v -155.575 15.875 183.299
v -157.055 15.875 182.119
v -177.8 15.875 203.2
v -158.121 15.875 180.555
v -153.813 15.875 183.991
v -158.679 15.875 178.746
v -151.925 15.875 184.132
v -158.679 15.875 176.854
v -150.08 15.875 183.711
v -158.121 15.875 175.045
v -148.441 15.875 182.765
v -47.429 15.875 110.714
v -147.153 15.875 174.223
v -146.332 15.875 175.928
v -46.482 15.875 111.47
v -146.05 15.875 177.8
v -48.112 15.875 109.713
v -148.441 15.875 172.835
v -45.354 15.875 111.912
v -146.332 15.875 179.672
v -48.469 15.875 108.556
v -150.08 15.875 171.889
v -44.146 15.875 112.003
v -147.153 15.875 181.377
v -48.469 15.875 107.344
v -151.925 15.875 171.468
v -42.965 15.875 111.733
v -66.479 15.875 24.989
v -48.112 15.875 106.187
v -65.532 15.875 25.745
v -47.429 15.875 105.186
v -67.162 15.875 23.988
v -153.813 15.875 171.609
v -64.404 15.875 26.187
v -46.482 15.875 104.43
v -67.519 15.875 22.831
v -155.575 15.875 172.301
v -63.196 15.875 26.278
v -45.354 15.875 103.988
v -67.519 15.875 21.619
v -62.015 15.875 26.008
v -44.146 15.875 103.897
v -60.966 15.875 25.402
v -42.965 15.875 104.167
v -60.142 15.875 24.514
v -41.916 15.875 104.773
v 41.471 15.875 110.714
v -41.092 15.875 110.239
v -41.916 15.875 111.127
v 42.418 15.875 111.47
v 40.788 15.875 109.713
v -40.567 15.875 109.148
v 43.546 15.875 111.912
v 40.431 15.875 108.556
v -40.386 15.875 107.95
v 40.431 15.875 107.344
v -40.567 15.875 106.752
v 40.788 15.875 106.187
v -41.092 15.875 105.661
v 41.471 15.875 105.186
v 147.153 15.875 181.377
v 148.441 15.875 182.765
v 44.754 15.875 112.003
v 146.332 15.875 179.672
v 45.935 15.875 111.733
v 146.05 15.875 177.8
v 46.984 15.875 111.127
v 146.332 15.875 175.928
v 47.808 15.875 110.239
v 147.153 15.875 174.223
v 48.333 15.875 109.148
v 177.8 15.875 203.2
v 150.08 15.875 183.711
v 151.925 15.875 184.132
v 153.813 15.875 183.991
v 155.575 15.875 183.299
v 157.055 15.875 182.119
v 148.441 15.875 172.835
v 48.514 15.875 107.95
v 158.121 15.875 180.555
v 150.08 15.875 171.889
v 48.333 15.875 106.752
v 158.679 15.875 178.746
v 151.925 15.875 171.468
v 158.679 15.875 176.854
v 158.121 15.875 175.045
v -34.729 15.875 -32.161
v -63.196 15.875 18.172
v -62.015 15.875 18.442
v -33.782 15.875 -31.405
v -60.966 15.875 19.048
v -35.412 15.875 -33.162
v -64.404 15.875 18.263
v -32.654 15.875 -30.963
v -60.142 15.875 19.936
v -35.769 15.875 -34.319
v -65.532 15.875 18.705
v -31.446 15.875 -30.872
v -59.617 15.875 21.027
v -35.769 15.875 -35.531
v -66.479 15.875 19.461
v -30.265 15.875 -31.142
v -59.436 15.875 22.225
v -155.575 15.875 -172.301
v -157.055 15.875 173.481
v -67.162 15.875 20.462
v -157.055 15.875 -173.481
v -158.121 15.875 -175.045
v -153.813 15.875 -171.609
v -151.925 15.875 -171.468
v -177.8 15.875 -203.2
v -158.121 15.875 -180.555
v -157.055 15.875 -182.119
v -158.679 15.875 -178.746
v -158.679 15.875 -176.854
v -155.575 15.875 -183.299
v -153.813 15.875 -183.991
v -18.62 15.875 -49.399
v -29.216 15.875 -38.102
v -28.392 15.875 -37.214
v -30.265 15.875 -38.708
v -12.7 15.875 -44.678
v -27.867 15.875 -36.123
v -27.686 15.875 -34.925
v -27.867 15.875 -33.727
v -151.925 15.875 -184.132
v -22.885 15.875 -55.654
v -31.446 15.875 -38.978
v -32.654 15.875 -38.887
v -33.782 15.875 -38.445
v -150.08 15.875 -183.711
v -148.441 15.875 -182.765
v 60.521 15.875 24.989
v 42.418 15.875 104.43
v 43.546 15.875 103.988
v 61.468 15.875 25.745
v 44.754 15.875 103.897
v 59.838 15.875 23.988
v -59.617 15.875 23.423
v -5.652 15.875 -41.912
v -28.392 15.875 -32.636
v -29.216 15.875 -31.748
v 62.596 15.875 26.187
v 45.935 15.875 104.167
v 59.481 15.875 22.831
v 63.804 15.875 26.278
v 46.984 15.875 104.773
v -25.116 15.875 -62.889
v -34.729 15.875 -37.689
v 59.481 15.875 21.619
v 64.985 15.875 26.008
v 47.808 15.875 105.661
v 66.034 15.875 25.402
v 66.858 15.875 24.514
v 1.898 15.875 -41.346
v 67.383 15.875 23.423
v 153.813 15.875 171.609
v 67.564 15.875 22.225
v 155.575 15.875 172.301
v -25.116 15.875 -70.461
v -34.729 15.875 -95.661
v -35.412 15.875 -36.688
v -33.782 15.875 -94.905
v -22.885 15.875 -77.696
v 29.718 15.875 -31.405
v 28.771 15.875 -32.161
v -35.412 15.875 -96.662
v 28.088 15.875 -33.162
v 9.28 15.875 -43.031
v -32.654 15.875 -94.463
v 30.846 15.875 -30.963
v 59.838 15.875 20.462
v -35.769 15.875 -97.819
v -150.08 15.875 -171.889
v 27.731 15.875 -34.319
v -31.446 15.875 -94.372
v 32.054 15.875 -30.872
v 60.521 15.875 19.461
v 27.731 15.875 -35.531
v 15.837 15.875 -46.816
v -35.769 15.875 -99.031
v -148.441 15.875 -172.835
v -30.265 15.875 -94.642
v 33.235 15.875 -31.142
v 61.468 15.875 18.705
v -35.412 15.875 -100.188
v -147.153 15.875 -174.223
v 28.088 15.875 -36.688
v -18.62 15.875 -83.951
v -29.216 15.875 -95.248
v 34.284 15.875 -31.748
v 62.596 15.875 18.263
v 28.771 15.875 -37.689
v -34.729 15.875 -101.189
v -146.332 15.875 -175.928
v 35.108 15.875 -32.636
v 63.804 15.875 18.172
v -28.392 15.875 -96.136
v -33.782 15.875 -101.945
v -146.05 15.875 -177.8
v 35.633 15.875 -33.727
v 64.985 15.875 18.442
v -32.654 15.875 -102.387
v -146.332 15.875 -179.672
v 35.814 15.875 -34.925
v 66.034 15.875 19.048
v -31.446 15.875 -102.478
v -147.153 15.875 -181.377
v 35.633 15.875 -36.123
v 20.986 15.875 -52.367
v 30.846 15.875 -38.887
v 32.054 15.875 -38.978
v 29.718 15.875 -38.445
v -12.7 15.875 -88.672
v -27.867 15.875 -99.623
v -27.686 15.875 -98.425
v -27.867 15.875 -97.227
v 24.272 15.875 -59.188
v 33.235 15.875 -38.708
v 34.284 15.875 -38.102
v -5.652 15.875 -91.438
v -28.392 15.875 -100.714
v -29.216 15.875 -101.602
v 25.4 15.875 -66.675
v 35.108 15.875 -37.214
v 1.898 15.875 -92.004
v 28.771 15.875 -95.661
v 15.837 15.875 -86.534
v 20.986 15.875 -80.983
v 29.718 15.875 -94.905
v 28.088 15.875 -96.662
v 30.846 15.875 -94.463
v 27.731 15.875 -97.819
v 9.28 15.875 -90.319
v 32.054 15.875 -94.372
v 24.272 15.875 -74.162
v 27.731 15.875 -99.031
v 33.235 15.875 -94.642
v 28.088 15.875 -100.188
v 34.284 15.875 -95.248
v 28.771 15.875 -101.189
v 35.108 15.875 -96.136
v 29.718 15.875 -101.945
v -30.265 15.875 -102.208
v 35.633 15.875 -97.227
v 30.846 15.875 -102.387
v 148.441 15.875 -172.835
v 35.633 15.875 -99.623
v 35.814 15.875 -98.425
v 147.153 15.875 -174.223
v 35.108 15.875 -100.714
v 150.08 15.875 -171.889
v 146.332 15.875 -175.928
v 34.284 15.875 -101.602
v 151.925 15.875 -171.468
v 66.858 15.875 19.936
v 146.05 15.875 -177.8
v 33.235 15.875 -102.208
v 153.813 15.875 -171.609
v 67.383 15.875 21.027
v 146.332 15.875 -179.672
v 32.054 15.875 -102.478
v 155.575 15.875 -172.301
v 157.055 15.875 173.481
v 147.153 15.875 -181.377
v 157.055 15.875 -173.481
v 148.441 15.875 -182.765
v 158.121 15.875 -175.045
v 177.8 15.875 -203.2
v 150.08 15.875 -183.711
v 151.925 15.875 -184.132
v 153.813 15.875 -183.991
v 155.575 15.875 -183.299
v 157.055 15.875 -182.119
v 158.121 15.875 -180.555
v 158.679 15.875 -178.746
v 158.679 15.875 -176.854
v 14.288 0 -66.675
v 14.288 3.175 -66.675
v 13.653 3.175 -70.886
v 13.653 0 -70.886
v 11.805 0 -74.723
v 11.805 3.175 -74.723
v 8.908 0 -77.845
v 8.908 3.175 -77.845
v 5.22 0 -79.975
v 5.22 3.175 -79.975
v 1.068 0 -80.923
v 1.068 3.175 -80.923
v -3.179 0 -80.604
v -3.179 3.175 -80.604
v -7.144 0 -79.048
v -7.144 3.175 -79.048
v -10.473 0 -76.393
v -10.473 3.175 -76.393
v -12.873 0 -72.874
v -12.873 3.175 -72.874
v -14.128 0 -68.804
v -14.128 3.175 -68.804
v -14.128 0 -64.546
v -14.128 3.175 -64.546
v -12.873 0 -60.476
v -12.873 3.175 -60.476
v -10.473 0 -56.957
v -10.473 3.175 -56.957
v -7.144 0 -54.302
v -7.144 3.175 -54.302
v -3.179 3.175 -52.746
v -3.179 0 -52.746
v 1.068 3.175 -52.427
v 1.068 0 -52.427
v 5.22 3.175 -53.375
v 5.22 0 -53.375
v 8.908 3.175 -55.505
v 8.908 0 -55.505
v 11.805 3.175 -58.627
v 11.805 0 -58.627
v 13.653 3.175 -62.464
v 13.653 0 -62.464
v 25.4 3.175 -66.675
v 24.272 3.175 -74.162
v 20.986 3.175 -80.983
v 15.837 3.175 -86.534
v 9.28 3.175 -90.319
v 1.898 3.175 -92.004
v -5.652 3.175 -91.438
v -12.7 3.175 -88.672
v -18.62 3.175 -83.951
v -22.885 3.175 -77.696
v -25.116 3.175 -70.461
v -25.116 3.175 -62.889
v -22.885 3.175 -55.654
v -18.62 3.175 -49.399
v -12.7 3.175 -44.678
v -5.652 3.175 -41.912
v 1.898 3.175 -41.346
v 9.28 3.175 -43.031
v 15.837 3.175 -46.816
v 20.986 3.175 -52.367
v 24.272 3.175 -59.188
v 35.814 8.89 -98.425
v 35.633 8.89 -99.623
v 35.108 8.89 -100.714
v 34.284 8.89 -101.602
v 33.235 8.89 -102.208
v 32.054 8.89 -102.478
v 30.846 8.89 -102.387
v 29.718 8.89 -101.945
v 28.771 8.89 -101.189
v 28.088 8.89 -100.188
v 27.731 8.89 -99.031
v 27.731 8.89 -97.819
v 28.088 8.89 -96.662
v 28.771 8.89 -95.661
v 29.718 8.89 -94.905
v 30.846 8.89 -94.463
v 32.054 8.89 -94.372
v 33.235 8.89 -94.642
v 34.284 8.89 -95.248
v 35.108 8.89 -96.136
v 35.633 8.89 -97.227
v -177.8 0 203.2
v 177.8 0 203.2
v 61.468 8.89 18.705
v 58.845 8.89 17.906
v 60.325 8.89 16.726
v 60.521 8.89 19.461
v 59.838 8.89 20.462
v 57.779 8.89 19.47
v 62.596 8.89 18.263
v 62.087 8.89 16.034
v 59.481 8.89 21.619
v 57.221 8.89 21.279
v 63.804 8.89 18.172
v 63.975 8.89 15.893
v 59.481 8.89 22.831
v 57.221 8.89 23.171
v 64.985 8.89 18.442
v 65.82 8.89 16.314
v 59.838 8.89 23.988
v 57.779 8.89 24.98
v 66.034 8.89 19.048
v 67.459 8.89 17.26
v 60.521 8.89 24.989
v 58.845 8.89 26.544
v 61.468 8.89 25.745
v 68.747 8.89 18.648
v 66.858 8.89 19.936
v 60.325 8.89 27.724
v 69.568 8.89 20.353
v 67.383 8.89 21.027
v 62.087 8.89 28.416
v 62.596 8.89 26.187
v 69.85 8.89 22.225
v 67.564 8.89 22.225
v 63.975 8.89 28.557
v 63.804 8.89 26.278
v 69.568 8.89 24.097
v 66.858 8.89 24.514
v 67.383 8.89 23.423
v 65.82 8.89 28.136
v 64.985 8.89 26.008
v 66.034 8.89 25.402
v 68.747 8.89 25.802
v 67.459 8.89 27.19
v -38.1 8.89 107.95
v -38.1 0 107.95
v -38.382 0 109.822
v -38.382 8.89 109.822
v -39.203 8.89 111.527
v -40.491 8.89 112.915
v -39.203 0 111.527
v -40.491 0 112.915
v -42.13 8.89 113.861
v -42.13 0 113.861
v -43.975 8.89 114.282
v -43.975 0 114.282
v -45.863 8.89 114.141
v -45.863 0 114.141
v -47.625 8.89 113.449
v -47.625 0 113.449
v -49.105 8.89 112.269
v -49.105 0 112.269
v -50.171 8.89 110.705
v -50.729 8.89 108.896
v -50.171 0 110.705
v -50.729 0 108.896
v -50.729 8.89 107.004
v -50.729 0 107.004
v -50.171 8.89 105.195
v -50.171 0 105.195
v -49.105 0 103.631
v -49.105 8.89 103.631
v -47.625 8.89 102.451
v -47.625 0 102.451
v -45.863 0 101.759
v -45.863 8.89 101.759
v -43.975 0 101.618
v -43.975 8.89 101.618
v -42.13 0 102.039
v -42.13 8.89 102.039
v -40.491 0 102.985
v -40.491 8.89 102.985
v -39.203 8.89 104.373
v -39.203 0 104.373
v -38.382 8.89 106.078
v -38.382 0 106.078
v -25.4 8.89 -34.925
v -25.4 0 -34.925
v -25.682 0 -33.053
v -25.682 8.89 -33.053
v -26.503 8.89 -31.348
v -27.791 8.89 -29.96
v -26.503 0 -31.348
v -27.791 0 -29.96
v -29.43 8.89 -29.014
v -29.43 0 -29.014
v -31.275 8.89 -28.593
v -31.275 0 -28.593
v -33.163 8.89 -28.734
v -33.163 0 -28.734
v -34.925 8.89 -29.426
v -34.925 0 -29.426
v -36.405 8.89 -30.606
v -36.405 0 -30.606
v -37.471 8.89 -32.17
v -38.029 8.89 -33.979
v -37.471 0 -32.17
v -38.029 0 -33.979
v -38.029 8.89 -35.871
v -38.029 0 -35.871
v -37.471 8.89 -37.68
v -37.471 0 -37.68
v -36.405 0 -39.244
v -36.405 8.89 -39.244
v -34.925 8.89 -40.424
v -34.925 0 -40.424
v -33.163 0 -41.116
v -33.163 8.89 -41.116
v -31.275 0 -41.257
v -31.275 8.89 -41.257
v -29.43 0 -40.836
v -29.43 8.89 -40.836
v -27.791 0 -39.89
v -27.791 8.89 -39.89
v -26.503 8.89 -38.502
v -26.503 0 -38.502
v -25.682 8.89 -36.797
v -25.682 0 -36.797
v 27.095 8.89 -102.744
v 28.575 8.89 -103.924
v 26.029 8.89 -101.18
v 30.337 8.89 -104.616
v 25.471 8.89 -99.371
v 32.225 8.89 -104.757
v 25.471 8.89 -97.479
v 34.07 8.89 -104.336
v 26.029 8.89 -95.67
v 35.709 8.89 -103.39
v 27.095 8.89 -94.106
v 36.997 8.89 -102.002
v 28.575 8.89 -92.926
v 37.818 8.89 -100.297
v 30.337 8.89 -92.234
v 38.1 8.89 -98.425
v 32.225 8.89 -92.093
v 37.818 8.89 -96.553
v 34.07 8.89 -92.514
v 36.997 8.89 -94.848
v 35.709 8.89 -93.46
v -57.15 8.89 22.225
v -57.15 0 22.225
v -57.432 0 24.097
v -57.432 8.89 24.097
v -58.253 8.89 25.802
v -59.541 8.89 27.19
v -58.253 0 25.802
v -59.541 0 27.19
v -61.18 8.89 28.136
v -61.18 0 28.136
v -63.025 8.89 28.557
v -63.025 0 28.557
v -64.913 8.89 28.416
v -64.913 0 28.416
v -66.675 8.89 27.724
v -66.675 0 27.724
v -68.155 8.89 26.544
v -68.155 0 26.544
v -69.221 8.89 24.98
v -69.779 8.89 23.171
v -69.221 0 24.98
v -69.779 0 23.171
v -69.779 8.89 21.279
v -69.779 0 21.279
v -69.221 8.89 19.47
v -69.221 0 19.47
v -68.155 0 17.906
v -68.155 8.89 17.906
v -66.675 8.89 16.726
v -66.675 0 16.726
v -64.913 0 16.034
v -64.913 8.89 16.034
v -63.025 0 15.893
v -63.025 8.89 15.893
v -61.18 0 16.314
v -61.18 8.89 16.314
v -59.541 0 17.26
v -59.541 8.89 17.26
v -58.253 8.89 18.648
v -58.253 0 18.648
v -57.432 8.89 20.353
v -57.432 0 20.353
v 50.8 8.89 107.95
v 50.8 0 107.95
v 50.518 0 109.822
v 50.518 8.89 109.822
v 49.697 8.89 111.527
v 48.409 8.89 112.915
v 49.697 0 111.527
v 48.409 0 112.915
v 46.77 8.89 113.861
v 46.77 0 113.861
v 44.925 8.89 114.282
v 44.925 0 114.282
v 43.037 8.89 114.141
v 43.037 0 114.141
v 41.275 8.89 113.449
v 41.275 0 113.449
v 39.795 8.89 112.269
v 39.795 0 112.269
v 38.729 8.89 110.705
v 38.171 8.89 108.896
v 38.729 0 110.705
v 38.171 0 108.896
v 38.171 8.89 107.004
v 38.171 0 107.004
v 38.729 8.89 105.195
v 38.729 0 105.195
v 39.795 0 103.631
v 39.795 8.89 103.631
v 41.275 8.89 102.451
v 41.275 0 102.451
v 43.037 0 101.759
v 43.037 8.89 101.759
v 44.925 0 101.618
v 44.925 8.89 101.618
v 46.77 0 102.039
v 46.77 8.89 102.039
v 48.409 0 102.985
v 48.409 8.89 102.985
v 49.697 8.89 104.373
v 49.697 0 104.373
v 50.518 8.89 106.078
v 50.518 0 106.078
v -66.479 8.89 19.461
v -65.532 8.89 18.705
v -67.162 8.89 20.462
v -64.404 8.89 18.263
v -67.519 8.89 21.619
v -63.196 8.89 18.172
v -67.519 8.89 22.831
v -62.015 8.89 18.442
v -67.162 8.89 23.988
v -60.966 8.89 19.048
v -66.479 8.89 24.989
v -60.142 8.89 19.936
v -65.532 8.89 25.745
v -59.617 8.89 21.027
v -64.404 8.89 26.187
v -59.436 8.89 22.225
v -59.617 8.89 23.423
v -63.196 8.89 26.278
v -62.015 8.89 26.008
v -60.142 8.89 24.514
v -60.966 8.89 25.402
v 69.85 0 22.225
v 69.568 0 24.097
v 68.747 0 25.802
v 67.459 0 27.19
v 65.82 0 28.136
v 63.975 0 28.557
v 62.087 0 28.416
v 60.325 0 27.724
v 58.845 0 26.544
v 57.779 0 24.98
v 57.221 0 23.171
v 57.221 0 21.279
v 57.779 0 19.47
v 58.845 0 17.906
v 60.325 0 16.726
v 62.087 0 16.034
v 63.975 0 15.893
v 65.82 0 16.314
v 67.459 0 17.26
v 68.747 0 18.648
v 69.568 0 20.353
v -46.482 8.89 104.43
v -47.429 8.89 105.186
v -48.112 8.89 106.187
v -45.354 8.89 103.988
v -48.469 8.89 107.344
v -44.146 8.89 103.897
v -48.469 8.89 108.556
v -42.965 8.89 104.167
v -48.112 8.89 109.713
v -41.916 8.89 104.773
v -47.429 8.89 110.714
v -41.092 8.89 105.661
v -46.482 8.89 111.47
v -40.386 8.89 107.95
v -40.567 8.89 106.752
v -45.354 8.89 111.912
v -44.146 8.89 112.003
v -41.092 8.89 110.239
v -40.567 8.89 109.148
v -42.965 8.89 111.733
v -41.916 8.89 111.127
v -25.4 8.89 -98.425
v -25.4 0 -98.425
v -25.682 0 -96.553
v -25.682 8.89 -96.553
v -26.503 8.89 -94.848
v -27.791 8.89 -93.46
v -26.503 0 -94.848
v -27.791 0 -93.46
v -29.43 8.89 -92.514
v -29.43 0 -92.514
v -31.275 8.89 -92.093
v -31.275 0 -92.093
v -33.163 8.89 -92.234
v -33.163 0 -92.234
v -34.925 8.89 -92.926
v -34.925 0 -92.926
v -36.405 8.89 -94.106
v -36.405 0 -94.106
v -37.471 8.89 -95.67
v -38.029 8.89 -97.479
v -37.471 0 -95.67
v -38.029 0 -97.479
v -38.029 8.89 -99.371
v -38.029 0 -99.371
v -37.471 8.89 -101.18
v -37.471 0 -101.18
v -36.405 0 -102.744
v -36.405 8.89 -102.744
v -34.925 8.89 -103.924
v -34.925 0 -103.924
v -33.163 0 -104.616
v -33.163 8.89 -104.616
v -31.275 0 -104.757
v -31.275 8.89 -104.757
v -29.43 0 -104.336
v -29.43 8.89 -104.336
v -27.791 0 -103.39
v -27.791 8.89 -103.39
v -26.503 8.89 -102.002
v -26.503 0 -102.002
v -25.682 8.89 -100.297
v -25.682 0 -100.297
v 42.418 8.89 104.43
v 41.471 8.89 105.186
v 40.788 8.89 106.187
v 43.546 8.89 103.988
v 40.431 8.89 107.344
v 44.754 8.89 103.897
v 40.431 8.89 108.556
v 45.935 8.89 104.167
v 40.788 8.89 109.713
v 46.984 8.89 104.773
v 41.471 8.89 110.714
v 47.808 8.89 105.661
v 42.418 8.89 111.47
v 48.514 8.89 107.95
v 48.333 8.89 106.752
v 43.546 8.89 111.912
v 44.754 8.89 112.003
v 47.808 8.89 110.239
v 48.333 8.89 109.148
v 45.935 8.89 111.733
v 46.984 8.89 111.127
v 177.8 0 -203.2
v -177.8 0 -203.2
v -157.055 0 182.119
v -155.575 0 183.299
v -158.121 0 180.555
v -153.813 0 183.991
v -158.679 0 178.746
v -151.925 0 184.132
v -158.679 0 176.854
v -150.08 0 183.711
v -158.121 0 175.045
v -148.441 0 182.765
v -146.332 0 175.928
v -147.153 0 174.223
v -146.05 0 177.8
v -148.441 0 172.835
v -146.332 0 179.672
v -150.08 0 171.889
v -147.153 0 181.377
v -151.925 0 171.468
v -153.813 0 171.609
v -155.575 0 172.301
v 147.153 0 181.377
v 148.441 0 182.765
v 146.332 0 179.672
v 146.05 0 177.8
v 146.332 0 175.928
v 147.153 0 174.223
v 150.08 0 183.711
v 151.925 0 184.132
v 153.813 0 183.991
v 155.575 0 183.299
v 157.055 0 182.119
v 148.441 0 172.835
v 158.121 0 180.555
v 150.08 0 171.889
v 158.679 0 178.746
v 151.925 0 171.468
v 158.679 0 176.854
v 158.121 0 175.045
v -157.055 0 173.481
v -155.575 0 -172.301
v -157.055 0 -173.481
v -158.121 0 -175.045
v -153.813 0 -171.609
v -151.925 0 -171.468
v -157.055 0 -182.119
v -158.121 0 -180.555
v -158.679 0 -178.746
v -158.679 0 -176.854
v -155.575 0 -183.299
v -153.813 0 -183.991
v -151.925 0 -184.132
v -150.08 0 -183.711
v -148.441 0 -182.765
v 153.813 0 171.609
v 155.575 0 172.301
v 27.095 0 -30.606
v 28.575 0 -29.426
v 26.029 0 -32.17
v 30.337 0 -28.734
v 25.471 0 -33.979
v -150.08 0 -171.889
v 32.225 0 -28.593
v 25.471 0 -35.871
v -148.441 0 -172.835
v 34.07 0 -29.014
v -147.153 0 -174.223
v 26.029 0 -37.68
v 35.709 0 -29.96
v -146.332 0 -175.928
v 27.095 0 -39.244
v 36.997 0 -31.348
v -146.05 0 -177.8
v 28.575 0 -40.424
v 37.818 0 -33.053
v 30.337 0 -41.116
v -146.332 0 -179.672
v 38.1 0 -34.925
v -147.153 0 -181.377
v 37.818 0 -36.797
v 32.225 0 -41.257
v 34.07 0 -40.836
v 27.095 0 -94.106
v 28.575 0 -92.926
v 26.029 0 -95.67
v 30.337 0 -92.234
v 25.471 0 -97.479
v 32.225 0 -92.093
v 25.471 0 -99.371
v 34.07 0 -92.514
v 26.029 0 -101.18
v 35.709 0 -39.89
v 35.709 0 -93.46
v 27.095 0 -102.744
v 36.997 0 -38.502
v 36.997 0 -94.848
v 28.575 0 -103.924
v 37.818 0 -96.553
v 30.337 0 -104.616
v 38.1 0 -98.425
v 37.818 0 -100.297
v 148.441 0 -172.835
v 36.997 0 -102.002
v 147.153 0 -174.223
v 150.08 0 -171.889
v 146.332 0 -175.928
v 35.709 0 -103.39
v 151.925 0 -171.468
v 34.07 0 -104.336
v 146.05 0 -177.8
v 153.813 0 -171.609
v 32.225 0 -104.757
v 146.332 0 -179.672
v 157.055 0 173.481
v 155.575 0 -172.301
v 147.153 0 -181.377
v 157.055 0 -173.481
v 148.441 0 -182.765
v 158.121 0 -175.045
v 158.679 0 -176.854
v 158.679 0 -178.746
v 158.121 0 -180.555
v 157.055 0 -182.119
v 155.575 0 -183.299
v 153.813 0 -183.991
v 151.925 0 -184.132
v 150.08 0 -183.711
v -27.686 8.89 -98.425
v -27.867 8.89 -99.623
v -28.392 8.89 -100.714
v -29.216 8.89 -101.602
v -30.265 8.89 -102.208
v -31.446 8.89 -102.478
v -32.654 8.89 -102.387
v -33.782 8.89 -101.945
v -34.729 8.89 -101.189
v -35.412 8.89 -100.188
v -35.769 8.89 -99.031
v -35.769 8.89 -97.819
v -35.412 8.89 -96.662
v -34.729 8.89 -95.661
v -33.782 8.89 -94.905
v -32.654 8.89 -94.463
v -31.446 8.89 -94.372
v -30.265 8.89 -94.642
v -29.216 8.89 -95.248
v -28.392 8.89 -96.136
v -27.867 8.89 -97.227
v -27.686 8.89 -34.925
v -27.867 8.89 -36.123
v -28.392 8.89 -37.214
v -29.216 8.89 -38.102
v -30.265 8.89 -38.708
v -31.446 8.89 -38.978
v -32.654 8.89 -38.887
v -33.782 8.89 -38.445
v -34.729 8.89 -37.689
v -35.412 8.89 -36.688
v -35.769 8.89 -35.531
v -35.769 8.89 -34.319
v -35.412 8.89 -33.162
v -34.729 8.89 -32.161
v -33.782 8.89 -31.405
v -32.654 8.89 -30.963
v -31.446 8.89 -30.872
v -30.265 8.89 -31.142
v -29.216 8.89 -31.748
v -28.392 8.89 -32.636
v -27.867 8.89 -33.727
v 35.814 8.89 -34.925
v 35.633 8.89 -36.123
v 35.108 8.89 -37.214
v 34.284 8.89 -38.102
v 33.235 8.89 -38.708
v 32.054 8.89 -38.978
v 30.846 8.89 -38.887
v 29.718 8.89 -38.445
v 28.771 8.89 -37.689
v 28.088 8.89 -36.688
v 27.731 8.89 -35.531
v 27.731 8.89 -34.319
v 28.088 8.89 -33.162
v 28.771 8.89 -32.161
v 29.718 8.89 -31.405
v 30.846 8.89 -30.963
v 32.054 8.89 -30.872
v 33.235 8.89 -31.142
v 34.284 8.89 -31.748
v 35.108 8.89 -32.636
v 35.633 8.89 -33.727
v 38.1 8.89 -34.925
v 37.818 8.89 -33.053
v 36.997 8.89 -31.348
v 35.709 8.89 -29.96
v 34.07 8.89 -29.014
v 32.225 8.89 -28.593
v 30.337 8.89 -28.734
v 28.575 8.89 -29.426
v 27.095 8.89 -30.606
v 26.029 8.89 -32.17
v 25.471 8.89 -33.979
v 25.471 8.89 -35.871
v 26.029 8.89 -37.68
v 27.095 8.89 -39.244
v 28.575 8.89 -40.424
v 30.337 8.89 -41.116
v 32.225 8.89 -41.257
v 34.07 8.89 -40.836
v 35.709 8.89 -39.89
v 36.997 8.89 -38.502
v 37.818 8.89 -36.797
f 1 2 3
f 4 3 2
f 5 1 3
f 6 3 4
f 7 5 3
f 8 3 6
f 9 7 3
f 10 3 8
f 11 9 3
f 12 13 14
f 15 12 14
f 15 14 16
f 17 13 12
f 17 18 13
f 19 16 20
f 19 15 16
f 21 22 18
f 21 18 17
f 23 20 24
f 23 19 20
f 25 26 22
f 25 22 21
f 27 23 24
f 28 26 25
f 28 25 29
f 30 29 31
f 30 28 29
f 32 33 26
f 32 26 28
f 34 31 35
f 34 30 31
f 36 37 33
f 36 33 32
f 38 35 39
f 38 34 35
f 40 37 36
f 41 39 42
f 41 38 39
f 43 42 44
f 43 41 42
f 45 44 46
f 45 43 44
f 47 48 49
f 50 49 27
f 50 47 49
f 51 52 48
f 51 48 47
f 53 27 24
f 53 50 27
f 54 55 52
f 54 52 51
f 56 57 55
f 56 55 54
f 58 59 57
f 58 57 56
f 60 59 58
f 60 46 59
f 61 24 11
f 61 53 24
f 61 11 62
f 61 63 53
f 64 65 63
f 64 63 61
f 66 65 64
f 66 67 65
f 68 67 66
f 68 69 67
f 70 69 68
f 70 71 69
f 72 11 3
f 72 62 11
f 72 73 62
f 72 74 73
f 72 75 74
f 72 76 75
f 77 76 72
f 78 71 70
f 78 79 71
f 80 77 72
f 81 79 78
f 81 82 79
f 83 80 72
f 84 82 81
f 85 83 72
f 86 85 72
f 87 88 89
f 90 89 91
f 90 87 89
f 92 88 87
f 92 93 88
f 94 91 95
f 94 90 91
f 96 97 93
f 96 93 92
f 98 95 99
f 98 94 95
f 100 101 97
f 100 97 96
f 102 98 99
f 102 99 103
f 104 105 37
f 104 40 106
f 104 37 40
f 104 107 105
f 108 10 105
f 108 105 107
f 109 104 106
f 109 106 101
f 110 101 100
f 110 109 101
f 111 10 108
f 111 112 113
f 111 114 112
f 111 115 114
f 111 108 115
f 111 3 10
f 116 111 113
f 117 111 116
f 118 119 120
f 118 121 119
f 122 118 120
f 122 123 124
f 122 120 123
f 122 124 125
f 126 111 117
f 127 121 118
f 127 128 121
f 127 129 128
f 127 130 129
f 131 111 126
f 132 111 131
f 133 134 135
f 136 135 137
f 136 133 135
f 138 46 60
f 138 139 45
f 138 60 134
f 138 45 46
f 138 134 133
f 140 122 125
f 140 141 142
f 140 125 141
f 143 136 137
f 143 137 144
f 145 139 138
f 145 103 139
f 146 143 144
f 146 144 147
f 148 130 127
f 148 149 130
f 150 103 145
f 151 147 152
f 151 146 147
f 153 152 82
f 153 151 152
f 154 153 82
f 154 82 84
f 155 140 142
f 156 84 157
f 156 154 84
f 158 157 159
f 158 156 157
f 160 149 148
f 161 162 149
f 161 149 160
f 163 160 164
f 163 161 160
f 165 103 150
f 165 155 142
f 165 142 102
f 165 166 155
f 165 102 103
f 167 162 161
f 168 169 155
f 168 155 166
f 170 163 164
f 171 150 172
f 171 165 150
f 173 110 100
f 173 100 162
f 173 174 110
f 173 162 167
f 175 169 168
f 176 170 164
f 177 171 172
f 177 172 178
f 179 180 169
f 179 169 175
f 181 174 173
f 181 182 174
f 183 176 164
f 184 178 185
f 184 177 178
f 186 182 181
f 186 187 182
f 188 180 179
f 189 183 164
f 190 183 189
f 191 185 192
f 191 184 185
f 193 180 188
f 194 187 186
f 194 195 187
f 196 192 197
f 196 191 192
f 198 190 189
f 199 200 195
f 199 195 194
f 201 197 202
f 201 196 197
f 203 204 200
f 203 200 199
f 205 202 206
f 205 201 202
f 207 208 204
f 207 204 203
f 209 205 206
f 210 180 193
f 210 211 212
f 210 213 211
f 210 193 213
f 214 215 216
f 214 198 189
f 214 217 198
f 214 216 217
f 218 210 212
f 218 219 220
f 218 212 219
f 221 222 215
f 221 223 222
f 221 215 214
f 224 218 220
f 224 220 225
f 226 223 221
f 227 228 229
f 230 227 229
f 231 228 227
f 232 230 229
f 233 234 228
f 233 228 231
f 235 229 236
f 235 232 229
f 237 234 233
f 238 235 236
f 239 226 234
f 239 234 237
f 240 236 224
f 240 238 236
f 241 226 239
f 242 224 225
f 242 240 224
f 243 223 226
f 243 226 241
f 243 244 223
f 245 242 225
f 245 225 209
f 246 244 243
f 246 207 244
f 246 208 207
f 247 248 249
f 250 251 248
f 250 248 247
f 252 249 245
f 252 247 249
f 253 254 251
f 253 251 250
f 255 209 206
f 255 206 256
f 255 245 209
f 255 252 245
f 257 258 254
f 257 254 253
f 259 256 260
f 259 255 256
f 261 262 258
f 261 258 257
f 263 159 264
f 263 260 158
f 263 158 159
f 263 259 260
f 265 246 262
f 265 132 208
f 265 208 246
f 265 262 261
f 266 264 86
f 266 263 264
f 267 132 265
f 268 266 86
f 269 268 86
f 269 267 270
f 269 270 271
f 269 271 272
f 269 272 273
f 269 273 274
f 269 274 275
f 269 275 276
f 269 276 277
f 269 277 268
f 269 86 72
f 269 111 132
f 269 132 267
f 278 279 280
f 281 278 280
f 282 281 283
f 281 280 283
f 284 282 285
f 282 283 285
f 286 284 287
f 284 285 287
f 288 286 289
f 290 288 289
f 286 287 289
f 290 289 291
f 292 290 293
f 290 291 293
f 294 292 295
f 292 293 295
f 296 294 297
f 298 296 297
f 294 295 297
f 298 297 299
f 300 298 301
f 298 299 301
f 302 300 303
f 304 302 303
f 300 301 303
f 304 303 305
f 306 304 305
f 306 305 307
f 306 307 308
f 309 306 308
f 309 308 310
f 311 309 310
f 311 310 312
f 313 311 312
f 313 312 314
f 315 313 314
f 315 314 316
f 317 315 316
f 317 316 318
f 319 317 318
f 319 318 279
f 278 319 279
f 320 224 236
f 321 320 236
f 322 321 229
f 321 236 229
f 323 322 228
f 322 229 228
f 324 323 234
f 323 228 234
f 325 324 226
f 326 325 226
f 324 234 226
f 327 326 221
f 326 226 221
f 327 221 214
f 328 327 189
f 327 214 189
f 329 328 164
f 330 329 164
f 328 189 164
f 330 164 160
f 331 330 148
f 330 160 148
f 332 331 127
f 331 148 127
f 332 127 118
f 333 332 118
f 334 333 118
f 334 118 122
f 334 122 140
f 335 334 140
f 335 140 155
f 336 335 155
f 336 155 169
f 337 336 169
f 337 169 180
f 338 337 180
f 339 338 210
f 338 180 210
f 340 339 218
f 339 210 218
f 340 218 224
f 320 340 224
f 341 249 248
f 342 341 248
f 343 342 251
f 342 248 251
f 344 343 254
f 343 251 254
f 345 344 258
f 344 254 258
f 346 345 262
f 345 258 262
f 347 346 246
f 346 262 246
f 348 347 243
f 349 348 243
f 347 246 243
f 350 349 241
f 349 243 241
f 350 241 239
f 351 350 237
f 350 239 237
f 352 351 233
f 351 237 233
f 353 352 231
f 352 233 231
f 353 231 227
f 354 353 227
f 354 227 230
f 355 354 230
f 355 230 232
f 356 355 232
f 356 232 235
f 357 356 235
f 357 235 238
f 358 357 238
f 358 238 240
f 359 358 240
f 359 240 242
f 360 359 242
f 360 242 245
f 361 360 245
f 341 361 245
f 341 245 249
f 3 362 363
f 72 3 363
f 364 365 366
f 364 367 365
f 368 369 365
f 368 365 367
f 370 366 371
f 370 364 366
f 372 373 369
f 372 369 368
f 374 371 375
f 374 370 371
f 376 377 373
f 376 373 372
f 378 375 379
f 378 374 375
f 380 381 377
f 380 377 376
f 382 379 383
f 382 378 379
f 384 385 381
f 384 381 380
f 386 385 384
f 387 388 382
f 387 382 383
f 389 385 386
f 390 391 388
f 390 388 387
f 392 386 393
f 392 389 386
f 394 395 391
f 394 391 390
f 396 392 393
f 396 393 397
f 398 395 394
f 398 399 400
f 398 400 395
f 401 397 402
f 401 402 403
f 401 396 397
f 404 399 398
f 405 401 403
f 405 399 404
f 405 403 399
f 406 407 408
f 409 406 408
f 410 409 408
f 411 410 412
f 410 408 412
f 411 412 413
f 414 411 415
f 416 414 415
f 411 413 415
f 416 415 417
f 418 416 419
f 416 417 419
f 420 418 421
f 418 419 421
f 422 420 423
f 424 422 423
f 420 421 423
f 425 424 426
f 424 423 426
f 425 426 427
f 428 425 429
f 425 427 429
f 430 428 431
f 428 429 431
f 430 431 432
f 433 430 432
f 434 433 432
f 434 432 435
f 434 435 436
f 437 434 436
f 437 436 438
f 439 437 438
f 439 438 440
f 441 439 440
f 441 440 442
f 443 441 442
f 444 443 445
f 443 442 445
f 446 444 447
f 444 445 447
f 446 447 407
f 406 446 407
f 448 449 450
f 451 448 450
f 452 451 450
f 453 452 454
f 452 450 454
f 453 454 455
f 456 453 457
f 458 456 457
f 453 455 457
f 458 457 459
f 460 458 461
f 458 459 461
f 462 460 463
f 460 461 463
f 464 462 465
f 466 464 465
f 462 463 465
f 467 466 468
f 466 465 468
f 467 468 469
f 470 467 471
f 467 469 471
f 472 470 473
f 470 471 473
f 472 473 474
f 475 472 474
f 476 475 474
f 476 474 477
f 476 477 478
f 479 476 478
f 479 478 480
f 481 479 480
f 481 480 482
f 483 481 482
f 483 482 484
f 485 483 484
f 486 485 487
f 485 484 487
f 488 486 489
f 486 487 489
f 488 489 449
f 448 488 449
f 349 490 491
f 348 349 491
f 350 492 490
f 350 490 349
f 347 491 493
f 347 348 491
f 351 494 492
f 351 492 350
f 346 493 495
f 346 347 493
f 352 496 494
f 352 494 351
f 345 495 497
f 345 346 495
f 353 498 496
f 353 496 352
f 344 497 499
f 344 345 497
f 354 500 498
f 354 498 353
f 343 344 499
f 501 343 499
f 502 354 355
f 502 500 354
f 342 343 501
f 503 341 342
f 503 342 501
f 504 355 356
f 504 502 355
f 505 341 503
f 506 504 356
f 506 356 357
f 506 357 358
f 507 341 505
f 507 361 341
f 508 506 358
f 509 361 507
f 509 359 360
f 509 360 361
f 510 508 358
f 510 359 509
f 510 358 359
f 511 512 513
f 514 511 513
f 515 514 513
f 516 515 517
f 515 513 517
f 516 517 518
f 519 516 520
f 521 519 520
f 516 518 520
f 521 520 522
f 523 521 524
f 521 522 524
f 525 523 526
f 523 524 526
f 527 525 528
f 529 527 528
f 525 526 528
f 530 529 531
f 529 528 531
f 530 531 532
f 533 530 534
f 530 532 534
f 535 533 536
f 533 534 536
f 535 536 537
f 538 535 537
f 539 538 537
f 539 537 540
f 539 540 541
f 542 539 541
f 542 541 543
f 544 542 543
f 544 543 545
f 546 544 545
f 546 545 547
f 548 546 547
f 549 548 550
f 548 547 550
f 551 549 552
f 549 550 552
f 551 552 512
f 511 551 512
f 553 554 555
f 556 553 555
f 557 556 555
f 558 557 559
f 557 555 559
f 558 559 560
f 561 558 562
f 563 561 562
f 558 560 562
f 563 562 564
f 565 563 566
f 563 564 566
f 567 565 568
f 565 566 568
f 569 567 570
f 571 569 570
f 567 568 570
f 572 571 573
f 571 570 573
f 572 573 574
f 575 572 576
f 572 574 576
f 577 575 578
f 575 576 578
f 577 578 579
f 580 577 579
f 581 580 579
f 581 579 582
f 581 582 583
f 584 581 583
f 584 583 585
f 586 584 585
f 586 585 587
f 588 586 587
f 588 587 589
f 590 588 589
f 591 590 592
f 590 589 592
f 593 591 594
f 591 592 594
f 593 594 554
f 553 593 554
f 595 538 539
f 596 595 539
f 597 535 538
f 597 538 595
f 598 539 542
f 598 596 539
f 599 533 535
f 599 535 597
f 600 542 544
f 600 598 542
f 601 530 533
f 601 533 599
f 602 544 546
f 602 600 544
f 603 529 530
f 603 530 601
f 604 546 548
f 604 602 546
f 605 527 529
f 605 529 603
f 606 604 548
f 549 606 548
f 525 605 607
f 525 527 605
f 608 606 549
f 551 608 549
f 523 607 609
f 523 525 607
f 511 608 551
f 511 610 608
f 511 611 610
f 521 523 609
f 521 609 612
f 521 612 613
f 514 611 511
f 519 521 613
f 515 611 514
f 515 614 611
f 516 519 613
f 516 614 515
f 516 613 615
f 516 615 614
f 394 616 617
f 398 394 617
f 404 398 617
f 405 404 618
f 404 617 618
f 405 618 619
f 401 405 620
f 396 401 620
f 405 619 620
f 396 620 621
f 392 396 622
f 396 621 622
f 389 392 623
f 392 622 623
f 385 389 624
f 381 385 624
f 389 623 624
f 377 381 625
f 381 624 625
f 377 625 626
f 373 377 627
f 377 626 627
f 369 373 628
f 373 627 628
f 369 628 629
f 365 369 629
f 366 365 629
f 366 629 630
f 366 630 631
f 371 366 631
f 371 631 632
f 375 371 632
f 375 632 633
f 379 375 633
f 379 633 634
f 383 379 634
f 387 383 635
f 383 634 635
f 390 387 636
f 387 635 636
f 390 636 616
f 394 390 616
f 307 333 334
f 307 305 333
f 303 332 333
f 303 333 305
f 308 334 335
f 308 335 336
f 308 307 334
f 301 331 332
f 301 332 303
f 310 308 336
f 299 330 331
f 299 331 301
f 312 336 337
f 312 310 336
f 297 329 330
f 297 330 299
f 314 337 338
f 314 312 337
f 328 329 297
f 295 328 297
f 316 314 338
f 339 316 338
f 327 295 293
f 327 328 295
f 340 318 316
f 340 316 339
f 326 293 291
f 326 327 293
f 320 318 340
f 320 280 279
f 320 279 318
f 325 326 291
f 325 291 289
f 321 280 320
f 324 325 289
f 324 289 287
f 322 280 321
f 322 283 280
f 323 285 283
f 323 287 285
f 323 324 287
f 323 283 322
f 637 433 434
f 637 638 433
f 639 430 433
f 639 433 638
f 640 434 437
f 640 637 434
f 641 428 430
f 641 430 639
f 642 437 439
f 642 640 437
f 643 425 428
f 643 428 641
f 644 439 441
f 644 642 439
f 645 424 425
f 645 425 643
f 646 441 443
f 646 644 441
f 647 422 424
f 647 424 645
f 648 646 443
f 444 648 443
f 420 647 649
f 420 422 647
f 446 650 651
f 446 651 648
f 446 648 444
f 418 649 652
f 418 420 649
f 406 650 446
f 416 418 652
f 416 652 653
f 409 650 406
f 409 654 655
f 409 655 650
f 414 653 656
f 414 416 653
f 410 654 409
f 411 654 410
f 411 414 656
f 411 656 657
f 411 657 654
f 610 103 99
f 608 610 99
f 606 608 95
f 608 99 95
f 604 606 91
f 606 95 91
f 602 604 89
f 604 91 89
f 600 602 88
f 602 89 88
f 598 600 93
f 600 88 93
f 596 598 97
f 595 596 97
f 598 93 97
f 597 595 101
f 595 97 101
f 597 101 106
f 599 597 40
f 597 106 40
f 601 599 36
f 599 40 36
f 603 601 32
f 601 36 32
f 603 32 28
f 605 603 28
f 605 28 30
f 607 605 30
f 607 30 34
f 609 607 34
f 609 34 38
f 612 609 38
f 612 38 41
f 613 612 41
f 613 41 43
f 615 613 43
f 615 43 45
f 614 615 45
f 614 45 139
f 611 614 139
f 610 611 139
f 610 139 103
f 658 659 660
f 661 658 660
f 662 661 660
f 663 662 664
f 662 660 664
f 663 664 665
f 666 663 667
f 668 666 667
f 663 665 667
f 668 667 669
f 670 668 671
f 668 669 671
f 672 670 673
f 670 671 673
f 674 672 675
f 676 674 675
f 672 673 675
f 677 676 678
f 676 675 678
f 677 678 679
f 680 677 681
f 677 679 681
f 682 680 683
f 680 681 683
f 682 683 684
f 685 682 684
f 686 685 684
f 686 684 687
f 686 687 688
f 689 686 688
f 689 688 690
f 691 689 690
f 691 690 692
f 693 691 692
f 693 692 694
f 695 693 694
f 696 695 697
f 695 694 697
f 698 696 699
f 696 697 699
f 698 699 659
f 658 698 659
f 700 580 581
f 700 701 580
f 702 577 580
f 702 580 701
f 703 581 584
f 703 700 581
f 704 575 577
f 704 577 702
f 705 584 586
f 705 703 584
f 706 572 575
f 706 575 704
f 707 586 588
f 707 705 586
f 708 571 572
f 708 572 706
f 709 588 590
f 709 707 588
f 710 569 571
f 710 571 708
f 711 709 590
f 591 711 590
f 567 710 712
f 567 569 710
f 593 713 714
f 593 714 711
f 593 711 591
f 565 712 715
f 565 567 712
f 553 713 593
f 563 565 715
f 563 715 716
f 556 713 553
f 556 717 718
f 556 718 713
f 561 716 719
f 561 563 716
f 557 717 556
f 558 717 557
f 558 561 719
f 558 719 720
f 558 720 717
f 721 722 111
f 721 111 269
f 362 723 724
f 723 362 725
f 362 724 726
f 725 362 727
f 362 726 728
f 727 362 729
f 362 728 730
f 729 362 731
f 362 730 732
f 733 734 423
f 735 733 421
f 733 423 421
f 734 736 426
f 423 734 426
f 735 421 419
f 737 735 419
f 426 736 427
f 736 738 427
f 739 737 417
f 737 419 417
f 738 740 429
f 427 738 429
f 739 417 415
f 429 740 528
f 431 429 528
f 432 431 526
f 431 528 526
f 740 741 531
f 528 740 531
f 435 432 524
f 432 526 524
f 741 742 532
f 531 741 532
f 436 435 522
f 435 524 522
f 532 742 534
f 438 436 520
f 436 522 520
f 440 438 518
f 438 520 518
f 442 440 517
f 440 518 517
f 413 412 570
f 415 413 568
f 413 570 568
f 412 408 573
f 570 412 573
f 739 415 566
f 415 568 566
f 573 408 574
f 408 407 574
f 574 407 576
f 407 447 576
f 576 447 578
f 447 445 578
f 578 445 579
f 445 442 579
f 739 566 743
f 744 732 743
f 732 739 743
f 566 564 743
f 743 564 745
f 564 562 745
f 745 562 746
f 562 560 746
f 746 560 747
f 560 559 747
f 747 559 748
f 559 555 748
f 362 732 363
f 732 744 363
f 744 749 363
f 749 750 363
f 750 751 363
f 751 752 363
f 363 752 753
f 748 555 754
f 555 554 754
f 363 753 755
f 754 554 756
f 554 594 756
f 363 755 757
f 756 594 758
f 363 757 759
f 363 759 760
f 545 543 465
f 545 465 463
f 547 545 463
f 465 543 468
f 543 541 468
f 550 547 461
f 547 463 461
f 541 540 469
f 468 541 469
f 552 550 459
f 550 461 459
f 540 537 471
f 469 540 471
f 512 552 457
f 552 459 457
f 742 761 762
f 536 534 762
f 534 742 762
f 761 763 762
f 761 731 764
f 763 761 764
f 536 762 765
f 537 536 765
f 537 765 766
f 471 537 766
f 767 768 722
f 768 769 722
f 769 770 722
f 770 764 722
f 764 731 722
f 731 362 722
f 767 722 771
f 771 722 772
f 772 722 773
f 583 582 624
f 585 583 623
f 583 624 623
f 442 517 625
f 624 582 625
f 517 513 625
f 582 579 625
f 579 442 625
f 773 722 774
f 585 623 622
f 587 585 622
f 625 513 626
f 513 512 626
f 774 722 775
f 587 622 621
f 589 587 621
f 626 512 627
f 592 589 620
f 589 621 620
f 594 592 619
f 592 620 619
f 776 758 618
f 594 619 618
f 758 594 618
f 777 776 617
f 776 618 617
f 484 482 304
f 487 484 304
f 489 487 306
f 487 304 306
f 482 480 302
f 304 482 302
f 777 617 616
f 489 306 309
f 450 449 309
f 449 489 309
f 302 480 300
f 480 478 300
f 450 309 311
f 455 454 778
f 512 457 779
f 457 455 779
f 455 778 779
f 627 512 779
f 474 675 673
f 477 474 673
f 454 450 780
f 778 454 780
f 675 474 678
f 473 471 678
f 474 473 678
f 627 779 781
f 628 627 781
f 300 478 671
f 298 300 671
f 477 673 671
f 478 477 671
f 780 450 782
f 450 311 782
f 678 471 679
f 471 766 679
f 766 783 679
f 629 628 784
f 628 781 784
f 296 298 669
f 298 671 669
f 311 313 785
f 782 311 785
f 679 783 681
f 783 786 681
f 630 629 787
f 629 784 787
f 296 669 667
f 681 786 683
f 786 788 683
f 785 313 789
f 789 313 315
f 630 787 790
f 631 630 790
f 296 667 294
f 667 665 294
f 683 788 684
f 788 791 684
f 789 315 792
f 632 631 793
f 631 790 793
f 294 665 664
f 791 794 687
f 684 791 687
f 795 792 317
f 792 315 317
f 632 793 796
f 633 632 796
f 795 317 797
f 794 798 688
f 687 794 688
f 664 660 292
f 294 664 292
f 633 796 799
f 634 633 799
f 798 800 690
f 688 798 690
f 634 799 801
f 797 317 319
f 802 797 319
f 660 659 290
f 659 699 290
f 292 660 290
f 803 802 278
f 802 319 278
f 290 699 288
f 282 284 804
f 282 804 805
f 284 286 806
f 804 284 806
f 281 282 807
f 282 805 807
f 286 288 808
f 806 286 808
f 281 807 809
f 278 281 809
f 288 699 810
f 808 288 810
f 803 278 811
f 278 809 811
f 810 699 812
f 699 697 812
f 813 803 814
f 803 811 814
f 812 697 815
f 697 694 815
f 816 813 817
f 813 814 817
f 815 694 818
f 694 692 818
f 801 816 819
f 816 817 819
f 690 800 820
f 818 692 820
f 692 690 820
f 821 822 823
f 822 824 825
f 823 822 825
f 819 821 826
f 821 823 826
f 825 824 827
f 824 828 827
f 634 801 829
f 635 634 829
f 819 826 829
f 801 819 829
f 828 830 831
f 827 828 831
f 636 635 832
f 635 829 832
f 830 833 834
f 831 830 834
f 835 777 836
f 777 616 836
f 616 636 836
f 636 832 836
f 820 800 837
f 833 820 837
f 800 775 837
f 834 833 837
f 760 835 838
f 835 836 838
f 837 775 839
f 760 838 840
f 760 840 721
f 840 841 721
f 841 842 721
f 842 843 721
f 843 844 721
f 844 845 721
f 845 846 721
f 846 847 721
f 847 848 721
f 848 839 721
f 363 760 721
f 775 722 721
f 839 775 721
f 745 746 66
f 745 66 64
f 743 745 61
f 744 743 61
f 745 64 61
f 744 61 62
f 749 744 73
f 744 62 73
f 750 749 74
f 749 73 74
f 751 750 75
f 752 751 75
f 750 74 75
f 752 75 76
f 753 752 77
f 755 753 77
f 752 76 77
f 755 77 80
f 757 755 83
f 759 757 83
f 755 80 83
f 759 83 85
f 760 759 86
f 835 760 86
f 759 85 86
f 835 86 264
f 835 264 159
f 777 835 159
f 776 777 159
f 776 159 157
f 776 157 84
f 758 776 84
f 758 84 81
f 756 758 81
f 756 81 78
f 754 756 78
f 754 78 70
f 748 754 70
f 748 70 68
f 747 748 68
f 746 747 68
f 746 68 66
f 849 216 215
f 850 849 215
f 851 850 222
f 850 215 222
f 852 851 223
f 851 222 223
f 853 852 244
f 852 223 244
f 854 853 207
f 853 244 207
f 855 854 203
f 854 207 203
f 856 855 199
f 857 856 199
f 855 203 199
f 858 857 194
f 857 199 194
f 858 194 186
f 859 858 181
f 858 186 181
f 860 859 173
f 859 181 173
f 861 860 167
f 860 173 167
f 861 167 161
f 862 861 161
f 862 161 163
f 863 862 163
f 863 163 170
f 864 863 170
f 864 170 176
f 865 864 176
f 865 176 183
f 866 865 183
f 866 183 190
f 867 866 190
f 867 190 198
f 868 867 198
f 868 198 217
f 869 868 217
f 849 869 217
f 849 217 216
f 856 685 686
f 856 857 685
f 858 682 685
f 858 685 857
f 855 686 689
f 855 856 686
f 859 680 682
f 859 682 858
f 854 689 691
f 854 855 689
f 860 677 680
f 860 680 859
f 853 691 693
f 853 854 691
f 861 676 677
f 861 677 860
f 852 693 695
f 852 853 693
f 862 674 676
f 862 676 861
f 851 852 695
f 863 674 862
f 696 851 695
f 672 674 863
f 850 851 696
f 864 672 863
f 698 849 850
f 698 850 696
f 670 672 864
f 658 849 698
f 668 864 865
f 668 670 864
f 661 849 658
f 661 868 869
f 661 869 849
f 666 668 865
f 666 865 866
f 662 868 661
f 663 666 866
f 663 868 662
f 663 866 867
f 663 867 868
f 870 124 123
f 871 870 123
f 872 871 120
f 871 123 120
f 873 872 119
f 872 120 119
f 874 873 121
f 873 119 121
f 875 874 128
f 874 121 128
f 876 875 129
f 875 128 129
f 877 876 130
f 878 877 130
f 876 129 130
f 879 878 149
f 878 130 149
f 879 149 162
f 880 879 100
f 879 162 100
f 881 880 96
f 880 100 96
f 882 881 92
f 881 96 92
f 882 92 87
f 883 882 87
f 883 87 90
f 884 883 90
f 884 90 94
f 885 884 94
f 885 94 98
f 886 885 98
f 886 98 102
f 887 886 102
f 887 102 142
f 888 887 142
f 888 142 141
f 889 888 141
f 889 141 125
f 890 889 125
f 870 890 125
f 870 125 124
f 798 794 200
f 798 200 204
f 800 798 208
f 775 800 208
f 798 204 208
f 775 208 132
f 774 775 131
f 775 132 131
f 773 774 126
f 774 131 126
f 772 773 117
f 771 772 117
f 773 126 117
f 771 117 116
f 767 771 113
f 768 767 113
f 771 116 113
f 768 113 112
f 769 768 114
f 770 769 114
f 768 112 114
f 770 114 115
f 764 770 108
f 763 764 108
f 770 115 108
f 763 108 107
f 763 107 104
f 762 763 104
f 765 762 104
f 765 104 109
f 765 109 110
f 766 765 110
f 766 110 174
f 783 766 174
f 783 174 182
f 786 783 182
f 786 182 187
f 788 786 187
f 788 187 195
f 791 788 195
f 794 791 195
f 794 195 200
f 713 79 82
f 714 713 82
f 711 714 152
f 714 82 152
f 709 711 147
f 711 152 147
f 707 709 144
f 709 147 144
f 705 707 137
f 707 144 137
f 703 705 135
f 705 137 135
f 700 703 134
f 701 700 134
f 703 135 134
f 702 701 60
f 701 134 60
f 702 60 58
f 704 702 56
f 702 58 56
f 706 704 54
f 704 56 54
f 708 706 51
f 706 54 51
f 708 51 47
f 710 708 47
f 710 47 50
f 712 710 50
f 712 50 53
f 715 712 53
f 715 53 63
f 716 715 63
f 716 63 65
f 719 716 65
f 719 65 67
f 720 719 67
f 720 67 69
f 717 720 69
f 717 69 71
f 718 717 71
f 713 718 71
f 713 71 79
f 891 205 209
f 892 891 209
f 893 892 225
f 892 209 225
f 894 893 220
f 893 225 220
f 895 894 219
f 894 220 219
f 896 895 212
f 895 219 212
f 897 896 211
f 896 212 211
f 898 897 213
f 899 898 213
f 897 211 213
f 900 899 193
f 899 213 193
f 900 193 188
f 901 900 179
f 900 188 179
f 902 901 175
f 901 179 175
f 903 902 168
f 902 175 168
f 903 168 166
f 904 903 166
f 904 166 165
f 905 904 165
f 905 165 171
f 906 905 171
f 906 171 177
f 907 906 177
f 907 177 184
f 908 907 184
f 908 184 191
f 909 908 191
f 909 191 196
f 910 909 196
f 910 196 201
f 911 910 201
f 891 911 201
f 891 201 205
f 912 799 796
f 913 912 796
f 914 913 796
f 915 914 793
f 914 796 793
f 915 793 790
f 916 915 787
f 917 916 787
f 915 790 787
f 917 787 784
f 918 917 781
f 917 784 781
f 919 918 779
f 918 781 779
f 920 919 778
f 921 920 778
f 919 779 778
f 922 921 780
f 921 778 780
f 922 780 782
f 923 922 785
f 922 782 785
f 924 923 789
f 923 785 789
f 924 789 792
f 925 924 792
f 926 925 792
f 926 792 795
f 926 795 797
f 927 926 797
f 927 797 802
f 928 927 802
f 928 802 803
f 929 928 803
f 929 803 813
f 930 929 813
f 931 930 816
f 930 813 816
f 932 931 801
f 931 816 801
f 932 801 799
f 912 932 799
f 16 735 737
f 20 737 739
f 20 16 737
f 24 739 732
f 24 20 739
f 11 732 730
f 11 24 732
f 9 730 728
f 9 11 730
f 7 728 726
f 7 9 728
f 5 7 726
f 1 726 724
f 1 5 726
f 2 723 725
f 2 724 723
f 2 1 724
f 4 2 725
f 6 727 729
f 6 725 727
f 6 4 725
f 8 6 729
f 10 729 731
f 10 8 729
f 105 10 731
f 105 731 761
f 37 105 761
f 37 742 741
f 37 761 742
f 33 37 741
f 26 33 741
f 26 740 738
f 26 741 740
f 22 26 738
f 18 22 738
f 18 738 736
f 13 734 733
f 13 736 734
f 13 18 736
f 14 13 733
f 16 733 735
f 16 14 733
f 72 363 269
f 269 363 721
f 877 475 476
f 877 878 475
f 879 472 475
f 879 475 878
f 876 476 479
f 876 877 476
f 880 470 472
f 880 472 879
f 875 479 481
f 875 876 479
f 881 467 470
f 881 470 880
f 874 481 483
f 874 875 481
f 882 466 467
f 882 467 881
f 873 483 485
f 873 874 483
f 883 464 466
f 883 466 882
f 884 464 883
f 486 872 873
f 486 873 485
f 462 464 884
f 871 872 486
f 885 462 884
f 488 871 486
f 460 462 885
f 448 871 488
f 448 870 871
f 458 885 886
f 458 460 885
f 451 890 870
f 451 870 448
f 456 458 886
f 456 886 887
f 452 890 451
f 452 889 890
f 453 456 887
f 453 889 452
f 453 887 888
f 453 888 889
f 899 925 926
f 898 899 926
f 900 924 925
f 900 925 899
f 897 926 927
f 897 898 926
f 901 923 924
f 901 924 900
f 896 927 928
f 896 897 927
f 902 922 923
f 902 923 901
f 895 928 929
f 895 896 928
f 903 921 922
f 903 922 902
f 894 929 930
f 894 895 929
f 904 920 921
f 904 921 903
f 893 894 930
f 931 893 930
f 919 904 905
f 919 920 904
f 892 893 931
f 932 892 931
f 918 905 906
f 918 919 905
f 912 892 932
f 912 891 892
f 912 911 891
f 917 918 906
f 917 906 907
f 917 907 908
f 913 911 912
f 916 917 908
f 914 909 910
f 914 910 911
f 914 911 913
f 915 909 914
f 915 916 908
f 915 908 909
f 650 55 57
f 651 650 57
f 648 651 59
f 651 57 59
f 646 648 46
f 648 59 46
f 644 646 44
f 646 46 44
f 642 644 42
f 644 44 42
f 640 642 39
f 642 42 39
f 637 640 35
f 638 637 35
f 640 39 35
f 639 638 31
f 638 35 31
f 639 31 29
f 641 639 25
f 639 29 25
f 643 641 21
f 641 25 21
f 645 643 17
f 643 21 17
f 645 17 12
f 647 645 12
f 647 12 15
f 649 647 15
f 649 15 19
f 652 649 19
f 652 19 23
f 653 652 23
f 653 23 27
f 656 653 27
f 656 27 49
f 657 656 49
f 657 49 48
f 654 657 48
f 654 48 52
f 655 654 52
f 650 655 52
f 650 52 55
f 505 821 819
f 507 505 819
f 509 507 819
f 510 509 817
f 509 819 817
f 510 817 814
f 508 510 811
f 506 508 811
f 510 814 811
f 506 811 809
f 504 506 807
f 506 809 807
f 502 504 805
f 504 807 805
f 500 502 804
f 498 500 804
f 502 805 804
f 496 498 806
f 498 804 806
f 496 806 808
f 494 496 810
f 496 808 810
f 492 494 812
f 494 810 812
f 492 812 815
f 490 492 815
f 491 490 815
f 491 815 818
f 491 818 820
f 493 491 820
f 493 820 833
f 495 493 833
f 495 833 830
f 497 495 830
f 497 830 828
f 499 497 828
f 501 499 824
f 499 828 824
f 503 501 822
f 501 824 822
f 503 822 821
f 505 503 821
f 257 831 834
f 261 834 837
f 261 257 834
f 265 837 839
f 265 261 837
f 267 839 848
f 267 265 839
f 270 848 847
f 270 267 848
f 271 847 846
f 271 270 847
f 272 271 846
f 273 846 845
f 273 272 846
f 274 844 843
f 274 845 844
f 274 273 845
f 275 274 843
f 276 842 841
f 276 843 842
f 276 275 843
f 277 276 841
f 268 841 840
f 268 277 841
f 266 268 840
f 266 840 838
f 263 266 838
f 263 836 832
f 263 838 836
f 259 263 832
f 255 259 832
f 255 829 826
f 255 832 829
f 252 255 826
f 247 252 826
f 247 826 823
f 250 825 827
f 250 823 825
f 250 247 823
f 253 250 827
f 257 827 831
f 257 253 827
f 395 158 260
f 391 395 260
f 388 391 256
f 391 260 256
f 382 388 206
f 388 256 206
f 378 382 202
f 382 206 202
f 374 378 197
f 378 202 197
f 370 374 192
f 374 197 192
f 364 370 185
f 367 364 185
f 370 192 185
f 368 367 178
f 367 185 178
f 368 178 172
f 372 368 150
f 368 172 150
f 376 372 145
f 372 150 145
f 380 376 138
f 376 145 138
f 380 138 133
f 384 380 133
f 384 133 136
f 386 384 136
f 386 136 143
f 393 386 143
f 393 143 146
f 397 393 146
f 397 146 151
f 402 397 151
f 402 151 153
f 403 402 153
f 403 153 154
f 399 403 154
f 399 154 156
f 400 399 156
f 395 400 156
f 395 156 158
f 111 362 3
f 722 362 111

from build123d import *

# Parameters (mm, degrees)
SKETCH1_W               = 355.6
SKETCH1_H               = 406.4
BOSS_EXTRUDE1_DEPTH     = 15.875
SKETCH2_R               = 6.35
CUT_EXTRUDE1_DEPTH      = 16.875
MIRROR2_COPY_1_SKETCH_R = 6.35
MIRROR2_COPY_1_DEPTH    = 16.875
SKETCH3_R               = 14.2875
SKETCH3_R_2             = 4.064
CUT_EXTRUDE2_DEPTH      = 16.875
SKETCH4_R               = 25.4
CUT_EXTRUDE3_DEPTH      = 12.7
SKETCH5_R               = 6.35
CUT_EXTRUDE4_DEPTH      = 8.89


with BuildPart() as part:
    # Sketch1 → Boss-Extrude1 (new body)
    with BuildSketch(Plane(origin=(0, 0, 0), x_dir=(1, 0, 0), z_dir=(0, 1, 0))):
        Rectangle(SKETCH1_W, SKETCH1_H)
    extrude(amount=BOSS_EXTRUDE1_DEPTH)

    # Sketch2 → Cut-Extrude1 (cut, through all)
    with BuildSketch(Plane(origin=(0, 15.875, 0), x_dir=(1, 0, 0), z_dir=(0, 1, 0))):
        with Locations((-152.4, 177.8)):
            Circle(SKETCH2_R)
    cut_extrude1 = extrude(amount=-CUT_EXTRUDE1_DEPTH, mode=Mode.SUBTRACT)

    # Mirror1: Cut-Extrude1 across plane
    add(cut_extrude1.mirror(Plane.ZY), mode=Mode.SUBTRACT)

    # Mirror2: Cut-Extrude1 across plane
    add(cut_extrude1.mirror(Plane(origin=(0, 0, 0), x_dir=(1, 0, 0), z_dir=(0, 0, -1))), mode=Mode.SUBTRACT)

    # Mirror2 copy 1 sketch → Mirror2 copy 1 (cut, through all)
    with BuildSketch(Plane(origin=(0, 15.875, 0), x_dir=(-1, 0, 0), z_dir=(0, 1, 0))):
        with Locations((-152.4, 177.8)):
            Circle(MIRROR2_COPY_1_SKETCH_R)
    extrude(amount=-MIRROR2_COPY_1_DEPTH, mode=Mode.SUBTRACT)

    # Sketch3 → Cut-Extrude2 (cut, through all)
    with BuildSketch(Plane(origin=(0, 15.875, 0), x_dir=(1, 0, 0), z_dir=(0, 1, 0))):
        with Locations((0, 66.675)):
            Circle(SKETCH3_R)
        with Locations((-63.5, -22.225)):
            Circle(SKETCH3_R_2)
        with Locations((63.5, -22.225)):
            Circle(SKETCH3_R_2)
        with Locations((44.45, -107.95)):
            Circle(SKETCH3_R_2)
        with Locations((-44.45, -107.95)):
            Circle(SKETCH3_R_2)
        with Locations((-31.75, 98.425)):
            Circle(SKETCH3_R_2)
        with Locations((-31.75, 34.925)):
            Circle(SKETCH3_R_2)
        with Locations((31.75, 98.425)):
            Circle(SKETCH3_R_2)
        with Locations((31.75, 34.925)):
            Circle(SKETCH3_R_2)
    extrude(amount=-CUT_EXTRUDE2_DEPTH, mode=Mode.SUBTRACT)

    # Sketch4 → Cut-Extrude3 (cut)
    with BuildSketch(Plane(origin=(0, 15.875, 0), x_dir=(1, 0, 0), z_dir=(0, 1, 0))):
        with Locations((0, 66.675)):
            Circle(SKETCH4_R)
    extrude(amount=-CUT_EXTRUDE3_DEPTH, mode=Mode.SUBTRACT)

    # Sketch5 → Cut-Extrude4 (cut)
    with BuildSketch(Plane.XZ):
        with Locations((-31.75, -98.425)):
            Circle(SKETCH5_R)
        with Locations((31.75, -98.425)):
            Circle(SKETCH5_R)
        with Locations((31.75, -34.925)):
            Circle(SKETCH5_R)
        with Locations((-31.75, -34.925)):
            Circle(SKETCH5_R)
        with Locations((-63.5, 22.225)):
            Circle(SKETCH5_R)
        with Locations((63.5, 22.225)):
            Circle(SKETCH5_R)
        with Locations((44.45, 107.95)):
            Circle(SKETCH5_R)
        with Locations((-44.45, 107.95)):
            Circle(SKETCH5_R)
    extrude(amount=-CUT_EXTRUDE4_DEPTH, mode=Mode.SUBTRACT)


solid = part.part
